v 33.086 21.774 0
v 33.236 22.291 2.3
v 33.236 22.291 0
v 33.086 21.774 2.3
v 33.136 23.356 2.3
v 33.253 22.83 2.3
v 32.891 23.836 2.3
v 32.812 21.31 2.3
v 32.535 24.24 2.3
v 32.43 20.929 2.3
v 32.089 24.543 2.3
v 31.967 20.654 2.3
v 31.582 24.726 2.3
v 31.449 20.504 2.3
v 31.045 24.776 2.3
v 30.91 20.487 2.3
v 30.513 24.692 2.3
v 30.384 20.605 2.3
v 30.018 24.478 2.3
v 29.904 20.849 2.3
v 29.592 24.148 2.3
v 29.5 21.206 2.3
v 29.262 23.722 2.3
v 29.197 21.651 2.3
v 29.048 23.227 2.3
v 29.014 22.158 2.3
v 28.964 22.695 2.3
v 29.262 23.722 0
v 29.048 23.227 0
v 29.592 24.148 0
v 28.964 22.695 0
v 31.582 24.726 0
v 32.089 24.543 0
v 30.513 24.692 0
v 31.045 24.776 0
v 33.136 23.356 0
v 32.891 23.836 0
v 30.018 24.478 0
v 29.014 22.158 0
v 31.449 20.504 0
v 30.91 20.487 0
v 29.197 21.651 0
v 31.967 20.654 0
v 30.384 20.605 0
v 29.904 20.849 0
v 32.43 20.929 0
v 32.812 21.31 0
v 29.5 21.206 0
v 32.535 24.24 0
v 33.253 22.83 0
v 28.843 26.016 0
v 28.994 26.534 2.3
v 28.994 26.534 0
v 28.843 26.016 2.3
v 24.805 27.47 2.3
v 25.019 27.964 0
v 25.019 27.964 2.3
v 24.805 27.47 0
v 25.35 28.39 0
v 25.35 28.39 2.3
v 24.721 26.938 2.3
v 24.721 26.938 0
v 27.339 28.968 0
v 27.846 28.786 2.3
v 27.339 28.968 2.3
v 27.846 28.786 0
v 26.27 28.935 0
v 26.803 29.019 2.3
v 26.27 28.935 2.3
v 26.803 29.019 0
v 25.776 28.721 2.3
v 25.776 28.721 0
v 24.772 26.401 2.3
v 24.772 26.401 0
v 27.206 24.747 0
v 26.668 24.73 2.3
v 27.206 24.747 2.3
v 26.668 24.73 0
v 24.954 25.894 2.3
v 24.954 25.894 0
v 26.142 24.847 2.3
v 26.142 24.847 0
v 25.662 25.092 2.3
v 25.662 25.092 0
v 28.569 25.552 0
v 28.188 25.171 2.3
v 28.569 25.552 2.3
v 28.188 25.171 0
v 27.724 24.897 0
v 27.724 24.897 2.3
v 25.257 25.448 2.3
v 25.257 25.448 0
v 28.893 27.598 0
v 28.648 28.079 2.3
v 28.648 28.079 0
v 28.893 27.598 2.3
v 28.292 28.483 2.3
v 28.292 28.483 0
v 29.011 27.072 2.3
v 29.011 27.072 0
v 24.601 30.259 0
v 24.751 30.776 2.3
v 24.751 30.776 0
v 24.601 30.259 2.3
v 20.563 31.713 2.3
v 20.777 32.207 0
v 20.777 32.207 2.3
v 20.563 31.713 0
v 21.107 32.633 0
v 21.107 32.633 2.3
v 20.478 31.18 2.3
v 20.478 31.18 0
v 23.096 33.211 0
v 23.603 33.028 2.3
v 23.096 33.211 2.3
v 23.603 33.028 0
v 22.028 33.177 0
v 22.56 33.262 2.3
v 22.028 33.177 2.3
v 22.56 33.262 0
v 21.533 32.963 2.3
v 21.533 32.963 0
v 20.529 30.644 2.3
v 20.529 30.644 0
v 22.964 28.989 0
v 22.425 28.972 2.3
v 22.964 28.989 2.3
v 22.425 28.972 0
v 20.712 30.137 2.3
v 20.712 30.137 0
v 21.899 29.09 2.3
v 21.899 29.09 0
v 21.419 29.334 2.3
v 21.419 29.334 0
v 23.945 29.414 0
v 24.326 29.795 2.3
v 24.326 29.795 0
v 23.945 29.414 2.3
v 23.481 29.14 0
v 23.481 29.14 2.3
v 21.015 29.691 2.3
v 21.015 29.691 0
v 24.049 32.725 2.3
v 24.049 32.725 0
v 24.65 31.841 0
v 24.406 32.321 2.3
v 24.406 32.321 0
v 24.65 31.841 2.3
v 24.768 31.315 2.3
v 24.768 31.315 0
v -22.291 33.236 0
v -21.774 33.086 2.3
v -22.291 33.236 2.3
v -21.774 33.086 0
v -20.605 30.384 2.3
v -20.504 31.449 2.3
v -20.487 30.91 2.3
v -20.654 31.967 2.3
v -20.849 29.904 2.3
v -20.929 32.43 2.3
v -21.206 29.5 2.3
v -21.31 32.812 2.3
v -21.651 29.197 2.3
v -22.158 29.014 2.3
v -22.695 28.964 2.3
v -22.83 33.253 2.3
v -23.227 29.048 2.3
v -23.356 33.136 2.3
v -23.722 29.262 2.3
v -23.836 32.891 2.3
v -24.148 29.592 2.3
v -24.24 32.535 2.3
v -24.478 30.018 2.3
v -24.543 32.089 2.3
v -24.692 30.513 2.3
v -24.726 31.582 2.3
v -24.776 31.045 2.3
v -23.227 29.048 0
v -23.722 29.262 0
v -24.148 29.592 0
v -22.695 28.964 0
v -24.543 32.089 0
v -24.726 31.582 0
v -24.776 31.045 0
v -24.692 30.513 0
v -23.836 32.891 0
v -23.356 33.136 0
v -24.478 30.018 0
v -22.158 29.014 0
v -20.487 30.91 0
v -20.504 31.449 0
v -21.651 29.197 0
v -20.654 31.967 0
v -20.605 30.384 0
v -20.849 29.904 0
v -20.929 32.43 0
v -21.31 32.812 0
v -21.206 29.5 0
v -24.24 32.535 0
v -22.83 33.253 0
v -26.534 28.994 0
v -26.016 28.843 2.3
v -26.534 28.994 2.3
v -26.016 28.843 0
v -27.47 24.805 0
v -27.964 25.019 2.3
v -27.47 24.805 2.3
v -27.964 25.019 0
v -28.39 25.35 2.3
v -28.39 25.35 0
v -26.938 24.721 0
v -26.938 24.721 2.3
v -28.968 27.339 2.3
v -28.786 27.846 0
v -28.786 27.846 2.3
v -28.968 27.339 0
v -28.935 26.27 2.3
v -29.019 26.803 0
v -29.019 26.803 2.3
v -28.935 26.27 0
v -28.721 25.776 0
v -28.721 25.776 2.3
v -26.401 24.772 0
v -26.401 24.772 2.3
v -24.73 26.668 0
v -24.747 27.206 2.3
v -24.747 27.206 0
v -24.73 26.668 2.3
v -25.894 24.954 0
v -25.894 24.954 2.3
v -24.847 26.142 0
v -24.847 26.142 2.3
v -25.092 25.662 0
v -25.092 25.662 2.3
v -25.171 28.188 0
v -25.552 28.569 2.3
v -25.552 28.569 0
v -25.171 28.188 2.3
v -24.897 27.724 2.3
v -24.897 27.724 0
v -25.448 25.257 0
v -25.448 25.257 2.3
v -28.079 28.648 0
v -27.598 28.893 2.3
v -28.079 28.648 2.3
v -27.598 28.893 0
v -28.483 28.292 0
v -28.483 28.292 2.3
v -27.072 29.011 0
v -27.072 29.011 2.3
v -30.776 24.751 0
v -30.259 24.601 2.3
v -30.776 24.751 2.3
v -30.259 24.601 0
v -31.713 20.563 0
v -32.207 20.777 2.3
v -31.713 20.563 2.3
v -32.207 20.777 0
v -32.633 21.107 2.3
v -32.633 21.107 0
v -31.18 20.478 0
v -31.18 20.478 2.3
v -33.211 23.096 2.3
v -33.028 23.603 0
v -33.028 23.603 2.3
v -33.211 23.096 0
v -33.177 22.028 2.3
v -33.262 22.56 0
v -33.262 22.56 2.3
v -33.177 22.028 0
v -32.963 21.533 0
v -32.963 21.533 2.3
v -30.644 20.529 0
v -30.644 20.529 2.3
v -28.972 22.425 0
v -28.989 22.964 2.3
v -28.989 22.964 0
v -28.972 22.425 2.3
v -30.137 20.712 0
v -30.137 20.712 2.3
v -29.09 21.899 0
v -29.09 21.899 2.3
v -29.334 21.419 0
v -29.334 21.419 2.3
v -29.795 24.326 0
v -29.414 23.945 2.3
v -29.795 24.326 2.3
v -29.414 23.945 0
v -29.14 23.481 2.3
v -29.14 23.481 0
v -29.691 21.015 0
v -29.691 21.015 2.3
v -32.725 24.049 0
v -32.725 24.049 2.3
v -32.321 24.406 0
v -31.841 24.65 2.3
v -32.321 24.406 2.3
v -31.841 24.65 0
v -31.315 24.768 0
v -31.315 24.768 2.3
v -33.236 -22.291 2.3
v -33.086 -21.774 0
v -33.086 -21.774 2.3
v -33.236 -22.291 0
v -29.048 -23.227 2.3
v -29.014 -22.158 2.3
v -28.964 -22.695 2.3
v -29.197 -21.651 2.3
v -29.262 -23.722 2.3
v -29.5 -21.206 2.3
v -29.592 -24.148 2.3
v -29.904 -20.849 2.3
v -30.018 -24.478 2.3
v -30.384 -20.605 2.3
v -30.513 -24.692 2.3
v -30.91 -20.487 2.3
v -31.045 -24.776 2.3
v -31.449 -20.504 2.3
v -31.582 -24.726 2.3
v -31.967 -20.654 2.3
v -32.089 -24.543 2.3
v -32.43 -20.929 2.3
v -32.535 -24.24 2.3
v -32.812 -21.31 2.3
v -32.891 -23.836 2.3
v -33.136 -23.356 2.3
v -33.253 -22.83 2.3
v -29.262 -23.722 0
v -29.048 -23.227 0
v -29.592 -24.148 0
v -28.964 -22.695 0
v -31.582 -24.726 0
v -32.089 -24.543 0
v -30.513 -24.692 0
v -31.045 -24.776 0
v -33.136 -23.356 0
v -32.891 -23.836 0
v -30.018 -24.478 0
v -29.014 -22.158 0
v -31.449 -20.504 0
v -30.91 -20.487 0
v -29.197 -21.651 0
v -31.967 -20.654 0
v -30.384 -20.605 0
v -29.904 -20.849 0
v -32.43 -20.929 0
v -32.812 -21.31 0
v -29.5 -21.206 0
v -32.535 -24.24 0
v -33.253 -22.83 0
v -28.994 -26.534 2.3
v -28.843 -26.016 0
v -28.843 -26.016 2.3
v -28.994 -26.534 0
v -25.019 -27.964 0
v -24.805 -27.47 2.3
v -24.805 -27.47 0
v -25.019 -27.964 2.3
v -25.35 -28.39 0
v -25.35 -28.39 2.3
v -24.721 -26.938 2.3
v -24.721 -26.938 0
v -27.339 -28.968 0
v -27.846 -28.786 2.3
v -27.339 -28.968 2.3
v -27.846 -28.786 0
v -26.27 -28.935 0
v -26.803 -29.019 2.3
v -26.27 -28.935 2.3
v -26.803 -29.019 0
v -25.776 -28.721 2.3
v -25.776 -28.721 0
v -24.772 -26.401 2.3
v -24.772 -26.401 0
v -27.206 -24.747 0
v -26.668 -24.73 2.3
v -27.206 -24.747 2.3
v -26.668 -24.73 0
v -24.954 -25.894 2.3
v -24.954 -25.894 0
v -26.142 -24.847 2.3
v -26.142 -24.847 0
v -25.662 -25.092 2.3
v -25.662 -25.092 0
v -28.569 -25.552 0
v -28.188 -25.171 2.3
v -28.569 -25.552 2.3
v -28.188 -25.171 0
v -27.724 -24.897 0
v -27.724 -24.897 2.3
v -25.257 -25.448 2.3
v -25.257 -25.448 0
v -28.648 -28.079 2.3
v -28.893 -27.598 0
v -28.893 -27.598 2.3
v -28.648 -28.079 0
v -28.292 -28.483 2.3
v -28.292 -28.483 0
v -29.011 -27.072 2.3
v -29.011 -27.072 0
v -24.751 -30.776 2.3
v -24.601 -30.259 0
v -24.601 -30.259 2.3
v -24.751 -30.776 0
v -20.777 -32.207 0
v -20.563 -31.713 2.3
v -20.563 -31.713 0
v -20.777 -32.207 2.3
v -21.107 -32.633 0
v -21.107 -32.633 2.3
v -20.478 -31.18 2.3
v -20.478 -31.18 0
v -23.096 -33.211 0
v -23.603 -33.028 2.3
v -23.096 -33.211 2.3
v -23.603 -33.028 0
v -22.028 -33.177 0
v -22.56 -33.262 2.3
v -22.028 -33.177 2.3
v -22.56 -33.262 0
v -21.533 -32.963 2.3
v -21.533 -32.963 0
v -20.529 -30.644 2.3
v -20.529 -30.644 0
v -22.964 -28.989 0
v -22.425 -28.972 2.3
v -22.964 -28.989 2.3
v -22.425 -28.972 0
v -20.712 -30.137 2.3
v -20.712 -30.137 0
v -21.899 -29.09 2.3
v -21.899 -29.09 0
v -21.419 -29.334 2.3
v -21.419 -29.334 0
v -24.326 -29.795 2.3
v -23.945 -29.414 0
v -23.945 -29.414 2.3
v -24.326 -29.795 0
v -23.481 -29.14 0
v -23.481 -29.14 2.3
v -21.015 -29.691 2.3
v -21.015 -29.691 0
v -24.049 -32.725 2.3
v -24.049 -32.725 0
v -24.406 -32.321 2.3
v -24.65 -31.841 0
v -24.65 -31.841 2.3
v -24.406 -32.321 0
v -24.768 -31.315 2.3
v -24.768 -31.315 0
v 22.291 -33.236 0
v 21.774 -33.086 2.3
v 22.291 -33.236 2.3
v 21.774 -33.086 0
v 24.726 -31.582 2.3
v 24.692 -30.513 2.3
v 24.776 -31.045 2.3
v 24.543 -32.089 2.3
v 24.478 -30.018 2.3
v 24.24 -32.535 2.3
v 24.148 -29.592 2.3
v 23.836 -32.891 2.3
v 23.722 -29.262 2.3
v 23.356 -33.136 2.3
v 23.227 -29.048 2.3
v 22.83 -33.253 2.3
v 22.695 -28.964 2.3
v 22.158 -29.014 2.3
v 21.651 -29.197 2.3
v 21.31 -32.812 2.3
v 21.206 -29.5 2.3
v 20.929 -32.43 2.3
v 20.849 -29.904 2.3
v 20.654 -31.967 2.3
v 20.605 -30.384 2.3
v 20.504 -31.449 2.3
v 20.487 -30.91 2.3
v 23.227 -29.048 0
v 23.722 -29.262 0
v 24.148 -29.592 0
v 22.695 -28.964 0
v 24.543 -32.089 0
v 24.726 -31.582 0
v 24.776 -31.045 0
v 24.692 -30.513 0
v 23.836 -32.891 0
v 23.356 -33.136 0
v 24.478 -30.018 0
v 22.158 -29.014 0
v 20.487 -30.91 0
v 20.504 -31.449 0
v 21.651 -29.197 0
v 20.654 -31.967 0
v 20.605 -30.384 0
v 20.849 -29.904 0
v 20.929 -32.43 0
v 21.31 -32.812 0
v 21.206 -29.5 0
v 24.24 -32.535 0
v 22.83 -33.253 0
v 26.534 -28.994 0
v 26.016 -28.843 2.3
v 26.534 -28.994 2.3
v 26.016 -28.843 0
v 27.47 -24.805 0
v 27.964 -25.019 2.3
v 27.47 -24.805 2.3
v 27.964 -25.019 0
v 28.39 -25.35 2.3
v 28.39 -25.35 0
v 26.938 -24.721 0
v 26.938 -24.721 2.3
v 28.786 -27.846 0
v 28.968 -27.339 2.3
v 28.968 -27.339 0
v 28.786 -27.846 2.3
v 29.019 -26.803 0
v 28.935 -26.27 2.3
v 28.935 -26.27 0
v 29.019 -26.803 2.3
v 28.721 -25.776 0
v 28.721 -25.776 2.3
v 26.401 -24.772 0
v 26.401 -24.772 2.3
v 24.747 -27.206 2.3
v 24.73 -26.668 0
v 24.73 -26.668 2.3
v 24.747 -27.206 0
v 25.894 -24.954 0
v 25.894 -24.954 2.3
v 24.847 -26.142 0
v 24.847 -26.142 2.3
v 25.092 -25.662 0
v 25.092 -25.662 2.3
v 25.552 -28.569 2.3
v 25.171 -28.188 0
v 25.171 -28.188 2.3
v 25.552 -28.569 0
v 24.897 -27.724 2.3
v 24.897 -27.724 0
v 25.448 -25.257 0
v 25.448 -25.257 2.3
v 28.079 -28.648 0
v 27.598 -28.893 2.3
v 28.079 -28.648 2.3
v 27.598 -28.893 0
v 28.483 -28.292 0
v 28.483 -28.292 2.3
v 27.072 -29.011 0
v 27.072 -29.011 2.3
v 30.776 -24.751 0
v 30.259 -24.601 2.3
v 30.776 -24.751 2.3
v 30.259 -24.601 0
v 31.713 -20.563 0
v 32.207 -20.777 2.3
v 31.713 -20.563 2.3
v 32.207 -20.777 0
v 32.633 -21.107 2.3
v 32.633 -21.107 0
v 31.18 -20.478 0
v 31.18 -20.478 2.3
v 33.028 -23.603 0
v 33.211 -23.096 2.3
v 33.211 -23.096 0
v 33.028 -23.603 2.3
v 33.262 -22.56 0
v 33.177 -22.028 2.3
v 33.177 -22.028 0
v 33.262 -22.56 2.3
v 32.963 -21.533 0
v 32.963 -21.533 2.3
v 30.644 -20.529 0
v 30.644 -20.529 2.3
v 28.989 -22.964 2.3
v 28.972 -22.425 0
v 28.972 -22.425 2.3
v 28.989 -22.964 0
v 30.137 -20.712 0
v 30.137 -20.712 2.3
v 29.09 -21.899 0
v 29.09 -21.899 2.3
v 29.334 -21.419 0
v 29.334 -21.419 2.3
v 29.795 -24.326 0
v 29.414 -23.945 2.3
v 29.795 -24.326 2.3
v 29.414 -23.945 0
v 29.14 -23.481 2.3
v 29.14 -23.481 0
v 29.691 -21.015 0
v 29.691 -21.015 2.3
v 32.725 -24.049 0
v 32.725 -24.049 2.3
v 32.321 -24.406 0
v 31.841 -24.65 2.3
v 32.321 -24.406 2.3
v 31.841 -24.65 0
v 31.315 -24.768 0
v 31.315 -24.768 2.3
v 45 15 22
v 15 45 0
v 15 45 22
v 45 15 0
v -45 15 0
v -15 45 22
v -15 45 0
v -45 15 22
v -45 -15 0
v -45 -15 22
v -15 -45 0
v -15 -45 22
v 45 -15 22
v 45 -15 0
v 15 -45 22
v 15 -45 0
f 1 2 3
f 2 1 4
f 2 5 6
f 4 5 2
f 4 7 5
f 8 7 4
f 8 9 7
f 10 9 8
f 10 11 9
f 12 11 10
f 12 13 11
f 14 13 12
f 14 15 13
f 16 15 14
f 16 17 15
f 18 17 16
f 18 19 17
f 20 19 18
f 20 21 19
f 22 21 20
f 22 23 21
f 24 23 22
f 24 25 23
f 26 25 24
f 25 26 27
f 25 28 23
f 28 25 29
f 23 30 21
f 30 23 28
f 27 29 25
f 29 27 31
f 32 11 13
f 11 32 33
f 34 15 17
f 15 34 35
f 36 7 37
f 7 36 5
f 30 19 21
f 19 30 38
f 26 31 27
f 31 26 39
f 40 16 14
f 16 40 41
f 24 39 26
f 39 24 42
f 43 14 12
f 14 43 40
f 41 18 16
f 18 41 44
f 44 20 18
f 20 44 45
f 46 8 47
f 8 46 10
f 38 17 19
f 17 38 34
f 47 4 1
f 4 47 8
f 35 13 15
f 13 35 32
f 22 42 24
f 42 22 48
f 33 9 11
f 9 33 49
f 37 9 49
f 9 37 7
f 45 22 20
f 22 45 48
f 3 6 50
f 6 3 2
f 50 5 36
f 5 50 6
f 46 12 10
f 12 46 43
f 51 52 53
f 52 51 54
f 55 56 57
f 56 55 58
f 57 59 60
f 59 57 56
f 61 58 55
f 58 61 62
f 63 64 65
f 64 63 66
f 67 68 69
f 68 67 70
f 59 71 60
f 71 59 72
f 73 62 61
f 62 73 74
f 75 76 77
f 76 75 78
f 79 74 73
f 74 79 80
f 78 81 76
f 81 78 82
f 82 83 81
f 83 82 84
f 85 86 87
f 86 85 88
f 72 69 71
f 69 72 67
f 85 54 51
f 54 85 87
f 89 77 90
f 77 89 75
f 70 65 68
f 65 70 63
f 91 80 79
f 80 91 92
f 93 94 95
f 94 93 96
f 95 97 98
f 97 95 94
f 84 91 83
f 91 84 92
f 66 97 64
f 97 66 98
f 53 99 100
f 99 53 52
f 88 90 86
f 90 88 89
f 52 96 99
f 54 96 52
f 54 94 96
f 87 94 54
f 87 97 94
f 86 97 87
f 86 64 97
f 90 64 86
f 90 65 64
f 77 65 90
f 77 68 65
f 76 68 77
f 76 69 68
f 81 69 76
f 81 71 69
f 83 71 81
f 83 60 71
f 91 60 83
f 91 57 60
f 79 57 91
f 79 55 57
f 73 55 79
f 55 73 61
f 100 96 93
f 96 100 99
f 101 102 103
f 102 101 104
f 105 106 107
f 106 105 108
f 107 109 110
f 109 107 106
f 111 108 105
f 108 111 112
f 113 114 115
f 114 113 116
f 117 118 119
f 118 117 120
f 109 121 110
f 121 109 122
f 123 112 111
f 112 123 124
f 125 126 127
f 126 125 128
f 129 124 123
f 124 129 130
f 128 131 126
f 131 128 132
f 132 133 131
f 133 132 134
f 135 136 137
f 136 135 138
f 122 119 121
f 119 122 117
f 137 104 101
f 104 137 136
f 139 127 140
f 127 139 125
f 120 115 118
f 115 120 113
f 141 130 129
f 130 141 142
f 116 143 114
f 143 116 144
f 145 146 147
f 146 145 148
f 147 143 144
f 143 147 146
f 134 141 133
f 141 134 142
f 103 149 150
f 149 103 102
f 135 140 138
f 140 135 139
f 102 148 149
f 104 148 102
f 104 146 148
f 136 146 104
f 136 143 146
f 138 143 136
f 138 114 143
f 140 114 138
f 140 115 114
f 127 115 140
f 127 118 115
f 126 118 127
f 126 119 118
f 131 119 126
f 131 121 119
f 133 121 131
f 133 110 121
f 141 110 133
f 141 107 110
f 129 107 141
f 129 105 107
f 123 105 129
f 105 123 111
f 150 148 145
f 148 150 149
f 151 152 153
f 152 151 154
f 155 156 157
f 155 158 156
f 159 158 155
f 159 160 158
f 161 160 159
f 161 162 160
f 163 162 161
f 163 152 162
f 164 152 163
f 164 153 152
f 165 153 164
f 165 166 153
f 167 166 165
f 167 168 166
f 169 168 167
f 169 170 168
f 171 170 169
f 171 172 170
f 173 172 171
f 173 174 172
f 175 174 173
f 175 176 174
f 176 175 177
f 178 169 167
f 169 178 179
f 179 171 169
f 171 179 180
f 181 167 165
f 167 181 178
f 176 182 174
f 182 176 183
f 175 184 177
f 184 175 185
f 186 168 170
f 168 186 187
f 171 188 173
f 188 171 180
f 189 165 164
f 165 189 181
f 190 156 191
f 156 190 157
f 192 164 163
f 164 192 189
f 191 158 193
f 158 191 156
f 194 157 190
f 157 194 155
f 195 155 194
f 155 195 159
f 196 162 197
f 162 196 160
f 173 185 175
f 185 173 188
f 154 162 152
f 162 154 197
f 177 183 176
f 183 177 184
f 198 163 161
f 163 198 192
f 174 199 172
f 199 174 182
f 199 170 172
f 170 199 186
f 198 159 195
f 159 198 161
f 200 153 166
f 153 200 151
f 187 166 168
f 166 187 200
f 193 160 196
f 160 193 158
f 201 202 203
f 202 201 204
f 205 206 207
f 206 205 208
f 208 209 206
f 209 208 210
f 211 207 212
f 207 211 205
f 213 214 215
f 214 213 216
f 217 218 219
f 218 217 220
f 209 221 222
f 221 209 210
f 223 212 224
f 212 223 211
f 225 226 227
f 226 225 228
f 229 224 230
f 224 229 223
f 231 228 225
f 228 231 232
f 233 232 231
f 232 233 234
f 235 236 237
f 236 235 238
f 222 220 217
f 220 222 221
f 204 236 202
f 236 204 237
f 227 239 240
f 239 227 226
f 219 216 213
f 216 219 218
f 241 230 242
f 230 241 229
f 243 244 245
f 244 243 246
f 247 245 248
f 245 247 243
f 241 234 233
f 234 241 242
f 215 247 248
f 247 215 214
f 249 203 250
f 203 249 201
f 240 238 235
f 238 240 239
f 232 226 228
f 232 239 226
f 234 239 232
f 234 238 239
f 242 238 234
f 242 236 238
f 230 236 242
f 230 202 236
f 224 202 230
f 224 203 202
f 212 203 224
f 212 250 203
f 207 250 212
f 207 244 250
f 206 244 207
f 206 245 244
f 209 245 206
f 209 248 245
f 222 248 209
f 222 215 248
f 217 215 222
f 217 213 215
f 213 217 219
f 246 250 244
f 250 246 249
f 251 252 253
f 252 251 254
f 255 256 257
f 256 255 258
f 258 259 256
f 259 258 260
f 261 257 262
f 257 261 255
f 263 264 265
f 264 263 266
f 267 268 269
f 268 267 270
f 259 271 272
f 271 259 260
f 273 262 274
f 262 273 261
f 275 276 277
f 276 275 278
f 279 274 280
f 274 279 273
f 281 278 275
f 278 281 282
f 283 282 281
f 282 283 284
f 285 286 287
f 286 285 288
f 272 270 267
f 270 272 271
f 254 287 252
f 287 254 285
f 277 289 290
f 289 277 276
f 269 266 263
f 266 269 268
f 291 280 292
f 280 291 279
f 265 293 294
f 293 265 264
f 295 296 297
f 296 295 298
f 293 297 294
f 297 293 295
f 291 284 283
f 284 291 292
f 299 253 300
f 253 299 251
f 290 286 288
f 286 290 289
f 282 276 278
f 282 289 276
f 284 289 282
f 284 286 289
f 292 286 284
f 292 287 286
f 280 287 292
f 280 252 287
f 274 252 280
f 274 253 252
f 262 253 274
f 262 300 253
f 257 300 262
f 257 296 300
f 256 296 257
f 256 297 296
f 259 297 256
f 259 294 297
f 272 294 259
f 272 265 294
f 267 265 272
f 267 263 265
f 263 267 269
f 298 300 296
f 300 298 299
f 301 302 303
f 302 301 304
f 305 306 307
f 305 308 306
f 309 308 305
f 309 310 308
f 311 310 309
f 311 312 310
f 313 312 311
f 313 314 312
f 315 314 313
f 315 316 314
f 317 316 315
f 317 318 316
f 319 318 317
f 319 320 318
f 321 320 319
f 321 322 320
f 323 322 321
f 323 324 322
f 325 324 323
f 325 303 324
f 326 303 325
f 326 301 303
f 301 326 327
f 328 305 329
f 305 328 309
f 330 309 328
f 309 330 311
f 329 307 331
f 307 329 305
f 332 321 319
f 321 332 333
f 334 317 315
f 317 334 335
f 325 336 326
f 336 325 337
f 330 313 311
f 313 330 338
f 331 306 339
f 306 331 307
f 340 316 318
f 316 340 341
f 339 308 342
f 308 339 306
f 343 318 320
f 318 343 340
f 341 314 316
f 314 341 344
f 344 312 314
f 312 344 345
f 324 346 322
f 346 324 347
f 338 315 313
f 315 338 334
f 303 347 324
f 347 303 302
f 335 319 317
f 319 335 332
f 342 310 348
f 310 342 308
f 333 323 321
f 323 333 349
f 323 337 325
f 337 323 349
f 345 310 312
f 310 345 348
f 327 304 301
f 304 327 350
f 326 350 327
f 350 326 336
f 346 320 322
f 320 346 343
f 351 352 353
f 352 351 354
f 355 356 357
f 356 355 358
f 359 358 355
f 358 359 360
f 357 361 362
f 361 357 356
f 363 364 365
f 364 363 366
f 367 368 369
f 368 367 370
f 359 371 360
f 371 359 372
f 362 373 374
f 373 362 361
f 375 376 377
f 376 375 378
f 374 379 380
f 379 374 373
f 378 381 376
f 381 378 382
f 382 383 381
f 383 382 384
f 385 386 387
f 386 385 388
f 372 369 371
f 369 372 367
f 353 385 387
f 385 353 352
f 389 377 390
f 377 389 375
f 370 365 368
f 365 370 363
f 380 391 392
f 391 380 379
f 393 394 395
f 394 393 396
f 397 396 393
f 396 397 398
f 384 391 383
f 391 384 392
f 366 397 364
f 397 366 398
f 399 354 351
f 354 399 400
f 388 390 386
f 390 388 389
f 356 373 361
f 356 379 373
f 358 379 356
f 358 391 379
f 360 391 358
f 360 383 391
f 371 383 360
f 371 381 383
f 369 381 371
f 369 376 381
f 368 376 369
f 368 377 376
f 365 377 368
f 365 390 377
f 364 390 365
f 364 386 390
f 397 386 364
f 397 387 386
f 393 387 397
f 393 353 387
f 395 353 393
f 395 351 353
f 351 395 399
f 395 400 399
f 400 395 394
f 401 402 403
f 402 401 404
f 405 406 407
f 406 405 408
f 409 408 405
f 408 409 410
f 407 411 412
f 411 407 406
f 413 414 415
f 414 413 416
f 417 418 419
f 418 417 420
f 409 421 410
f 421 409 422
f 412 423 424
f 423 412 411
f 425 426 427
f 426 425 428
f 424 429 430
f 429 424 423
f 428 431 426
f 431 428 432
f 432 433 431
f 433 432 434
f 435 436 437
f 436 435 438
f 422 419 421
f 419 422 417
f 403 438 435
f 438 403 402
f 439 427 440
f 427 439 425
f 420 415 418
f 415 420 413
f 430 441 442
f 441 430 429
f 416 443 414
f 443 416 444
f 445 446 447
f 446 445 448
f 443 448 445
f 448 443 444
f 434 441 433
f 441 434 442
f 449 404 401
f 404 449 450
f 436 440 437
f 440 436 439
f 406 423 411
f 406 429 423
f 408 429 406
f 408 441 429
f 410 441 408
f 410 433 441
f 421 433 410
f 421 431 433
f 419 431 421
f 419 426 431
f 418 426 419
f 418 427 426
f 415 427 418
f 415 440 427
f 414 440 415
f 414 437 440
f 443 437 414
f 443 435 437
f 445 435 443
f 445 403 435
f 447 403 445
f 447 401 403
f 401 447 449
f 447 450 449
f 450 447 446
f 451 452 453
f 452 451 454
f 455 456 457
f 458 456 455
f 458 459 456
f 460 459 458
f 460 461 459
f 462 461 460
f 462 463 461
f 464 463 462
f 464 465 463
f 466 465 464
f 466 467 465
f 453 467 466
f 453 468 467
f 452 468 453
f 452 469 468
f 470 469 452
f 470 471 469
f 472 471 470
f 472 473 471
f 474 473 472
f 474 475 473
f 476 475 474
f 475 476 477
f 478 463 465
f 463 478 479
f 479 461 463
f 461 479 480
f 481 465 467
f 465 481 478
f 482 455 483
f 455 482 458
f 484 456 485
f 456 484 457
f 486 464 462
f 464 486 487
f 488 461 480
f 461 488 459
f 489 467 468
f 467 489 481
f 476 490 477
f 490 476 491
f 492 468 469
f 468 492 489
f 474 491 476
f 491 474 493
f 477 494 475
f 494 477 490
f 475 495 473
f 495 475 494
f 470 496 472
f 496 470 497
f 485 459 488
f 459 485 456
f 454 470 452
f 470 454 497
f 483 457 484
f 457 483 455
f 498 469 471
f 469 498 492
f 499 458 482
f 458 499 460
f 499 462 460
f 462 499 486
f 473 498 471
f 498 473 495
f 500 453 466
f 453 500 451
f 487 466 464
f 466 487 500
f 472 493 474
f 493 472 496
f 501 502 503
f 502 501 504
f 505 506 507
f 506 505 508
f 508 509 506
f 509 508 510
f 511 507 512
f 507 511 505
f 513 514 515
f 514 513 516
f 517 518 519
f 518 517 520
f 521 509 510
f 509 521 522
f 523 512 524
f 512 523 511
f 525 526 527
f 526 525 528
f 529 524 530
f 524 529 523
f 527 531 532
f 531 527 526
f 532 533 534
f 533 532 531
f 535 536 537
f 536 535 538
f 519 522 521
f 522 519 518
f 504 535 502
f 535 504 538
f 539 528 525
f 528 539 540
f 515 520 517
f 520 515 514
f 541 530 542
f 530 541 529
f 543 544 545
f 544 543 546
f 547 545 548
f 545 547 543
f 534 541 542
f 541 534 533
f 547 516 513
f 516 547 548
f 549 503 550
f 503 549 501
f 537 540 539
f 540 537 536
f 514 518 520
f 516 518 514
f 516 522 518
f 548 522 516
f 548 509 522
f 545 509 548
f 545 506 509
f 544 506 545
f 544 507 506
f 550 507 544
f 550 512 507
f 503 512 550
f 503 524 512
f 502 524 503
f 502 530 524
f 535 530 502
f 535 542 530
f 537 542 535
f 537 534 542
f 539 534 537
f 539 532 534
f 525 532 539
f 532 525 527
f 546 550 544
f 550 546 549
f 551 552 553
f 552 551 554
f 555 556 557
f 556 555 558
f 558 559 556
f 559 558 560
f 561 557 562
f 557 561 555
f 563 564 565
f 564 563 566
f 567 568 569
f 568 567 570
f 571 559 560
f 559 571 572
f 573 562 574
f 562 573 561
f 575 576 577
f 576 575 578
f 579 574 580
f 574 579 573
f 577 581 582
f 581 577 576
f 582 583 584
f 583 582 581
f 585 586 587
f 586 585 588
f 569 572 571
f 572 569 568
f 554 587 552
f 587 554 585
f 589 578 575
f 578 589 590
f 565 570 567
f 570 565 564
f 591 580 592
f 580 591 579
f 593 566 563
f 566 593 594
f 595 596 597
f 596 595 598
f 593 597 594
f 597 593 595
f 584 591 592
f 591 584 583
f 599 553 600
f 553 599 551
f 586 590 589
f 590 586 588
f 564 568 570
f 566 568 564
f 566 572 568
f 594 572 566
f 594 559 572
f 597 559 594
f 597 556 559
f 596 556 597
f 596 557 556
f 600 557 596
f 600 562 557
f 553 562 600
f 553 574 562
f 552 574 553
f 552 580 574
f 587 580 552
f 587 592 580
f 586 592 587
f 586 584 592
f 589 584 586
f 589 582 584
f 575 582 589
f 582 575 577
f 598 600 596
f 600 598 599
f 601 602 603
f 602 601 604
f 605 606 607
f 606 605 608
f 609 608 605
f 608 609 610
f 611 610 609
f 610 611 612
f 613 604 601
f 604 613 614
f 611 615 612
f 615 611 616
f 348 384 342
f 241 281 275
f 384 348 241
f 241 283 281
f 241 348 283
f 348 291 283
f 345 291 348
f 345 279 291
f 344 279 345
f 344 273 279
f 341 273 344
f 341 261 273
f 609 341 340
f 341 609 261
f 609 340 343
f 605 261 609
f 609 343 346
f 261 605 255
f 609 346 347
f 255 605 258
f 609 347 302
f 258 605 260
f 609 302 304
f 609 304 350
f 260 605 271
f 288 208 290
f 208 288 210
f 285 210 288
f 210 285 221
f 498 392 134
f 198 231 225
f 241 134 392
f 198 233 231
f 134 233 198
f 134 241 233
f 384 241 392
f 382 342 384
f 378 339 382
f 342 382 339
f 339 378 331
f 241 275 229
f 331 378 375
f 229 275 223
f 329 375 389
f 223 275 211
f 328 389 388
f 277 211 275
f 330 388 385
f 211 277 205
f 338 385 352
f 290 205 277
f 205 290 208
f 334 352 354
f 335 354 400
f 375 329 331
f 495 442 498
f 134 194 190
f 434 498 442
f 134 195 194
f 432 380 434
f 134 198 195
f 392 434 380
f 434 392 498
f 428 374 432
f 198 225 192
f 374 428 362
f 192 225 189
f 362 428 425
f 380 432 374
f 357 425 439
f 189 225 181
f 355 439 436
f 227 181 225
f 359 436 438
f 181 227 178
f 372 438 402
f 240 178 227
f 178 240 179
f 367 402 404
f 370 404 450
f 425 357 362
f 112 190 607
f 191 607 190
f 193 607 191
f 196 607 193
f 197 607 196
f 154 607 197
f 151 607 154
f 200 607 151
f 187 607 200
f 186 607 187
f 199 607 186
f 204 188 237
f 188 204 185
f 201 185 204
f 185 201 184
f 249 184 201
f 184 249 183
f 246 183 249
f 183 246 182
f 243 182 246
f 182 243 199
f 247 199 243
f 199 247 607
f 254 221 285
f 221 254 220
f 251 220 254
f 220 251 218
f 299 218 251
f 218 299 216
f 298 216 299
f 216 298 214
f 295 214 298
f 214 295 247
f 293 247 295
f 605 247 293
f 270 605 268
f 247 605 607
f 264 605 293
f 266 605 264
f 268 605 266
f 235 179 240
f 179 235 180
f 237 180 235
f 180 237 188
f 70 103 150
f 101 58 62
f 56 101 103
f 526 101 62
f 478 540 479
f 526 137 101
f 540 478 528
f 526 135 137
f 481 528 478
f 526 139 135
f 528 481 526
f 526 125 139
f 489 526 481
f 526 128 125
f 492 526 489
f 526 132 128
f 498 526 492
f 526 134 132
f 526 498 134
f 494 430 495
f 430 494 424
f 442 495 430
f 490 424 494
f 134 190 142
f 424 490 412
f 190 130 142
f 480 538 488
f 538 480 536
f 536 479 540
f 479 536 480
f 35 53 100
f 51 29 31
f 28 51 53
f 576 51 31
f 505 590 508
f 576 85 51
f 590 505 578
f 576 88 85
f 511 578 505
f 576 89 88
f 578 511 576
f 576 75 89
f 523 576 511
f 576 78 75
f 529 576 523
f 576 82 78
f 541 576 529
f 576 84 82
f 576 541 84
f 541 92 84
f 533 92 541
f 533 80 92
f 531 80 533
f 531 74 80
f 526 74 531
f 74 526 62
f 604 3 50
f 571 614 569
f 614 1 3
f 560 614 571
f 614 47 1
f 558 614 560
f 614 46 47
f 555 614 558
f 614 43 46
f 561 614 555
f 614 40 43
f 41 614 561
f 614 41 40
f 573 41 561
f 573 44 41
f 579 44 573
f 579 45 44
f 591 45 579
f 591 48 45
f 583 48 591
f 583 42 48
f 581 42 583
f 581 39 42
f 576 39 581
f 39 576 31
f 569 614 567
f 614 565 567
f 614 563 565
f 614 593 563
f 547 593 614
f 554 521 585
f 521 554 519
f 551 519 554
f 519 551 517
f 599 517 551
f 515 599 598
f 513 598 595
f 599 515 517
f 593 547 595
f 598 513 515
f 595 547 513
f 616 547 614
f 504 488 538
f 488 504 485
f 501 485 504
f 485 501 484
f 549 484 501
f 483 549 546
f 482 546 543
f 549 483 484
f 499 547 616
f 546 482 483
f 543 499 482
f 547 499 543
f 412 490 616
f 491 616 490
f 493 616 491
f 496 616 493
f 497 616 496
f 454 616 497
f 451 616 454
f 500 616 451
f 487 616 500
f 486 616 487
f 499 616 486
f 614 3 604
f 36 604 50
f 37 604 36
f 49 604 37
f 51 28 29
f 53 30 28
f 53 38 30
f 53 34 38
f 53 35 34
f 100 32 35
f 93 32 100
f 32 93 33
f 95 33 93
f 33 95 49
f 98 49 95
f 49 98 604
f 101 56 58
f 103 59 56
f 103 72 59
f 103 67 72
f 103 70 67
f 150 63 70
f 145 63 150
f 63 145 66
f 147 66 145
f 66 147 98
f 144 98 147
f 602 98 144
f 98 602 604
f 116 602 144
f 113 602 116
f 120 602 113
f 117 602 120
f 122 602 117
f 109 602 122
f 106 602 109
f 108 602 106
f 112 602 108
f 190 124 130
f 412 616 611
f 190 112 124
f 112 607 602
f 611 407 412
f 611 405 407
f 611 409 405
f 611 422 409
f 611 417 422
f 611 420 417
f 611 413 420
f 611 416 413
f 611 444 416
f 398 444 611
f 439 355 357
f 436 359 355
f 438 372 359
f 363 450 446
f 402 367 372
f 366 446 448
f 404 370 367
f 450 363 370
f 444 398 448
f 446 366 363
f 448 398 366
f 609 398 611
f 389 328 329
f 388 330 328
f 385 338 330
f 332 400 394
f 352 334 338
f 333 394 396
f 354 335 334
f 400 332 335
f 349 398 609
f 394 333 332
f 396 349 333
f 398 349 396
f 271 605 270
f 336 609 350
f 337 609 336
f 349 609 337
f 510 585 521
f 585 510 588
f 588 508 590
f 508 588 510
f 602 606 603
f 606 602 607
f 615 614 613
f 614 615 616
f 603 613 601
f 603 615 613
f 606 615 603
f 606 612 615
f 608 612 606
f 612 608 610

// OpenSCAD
// file: ../../util/rounded.scad
// Do a rounded cube
module rounded(x=10, y=10, z=10, r=3, center=false) {
  if (center) {
    translate([-(x/2),-(y/2),0])
      rounded(x, y, z, r);
  } else {
    translate([r,r,0])
    minkowski() {
      cube([x-2*r,y-2*r,z/2]);
      cylinder(h=z/2, r=r);
    }
  }
}
// file: ../../util/hole3.scad
module hole3()
{
    cylinder(d=3.5, h=99, center=true);
}
// file: ../../util/repeat4.scad
module repeat4()
{
    for (r=[0:3])
    rotate([0,0,90*r])
    children();
}
// file: ../../util/hexapath.scad
// Follow an hexagonal path
module hexapath(X, Y, thickness, center=false)
{
    union() {
        linear_extrude(thickness, center=center)
            polygon(points=[
                    [X, Y], [X, -Y], 
                    [Y, -X], [-Y, -X],
                    [-X, -Y], [-X, Y],
                    [-Y, X], [Y, X], 
            ]);
    }
}
// file: ../../models/ollo.scad
// Diameter of plastic ollo holes
OlloHoles = 4.3;

// Width of Ollo "real" plastic
OlloWidth = 3;

// Distance between two ollo holes
OlloSpacing = 6;

// Do an Ollo hole on the part
module olloHole(depth=2.2)
{
    translate([0,0,-0.1])
      cylinder(depth+0.2, OlloHoles/2, OlloHoles/2);
}

// Do 3 ollo holes
module threeOllo(depth=2.2)
{
  for (xy=[[-OlloSpacing,0],[0,0],[OlloSpacing,0]]) {
    translate([xy[0], xy[1], 0])
    olloHole(depth);
  }
}

// Do a servo arm holes
module servoArm(depth=2.2)
{
    threeOllo(depth);
    rotate([0,0,90])
      threeOllo(depth);
}
// file: ../../parts/batfix.scad
include <../models/ollo.scad>;
use <../util/rounded.scad>;
use <../util/screws.scad>;

module batfix(thickness=2.2, cavity=13, height=10, screws=3.2,print=false)
{
	shift=9;
	holesSpacingW = OlloSpacing*7;
	holesSpacingH = OlloSpacing*2;
	R=print?[90,0,0]:[0,0,0];
	translate([-shift,0,height-2*thickness])
	rotate(R)
	difference() {
		union() {
			rounded(50, 20, thickness, 2, center=true);
			translate([shift,0,thickness-height/2])
			cube([cavity+2*thickness,20,height], center=true);
		}
		
		for (X=[-holesSpacingW/2, holesSpacingW/2])
		for (Y=[-holesSpacingH/2, holesSpacingH/2])
		translate([X,Y,-1])			
			cylinder(d=screws, h=thickness+2);
		
		translate([shift,0,0.01+2*thickness-height/2])
			cube([cavity,22,height], center=true);
		
		translate([shift,0,thickness-height])
			children();
	}
}

batfix();
// file: ../../parts/leg.scad
use <../models/ollo.scad>;
use <../util/rounded.scad>;

module leg(sizeA=60, sizeB=20, sizeC=20, sizeBottom=10,
        sizeTop=15, mode="arm", fixationAngle=0, thickness=2.2, print=false)
{
    xOffset = (mode == "side") ? -10 : 0;
    spacing = (mode == "side") ? 24 : 30;

    module legSide()
    {
        difference() {
            union() {
                translate([0,0,sizeA/2])
                    rotate([0,90,0]) {
                        cube([sizeA, 20, thickness], center=true);
                        if (mode == "side") {
                            translate([15-sizeA/2, 10, -thickness/2])
                                rotate([0,0,+fixationAngle])
                                rounded(25,10,thickness, center=true);
                        }
                    }
            }
            translate([-thickness, 0, sizeA-15]) {
                rotate([90,0,90]) {
                    if (mode == "arm") {
                        servoArm(2*thickness);
                    }
                }
                if (mode == "side") {
                    translate([0,10,0])
                        rotate([90,90-fixationAngle,90])
                        threeOllo(2*thickness);
                }
            }
        }
        translate([-thickness/2,0,sizeA]) {
            rotate([90,0,90])
                linear_extrude(thickness)
                polygon([[-10,0],[-1,sizeTop],[1,sizeTop],[10,0]]);
        }
    }

    module biais() {
        Dx = (spacing-sizeBottom)/2;
        Dy = sizeC;
        Dl = sqrt(pow(Dx,2)+pow(Dy,2));

        translate([-(spacing/2)-thickness,-10,-(sizeB+thickness/2)])
            rotate([0,atan2(Dy,Dx),0])
            cube([Dl,20,thickness]);
    }

    if (print) {
        translate([0,0,10-xOffset])
            rotate([90,0,0])
            leg(sizeA, sizeB, sizeC, sizeBottom,
                    sizeTop, mode, fixationAngle, thickness, false);
    } else {
        echo("[PART] leg");
        translate([0,xOffset,-sizeA+15]) {
            cube([spacing+thickness*2, 20, thickness], center=true);

            translate([spacing/2+thickness/2,0,0])
                legSide();
            translate([-(spacing/2+thickness/2),0,0])
                legSide();

            translate([0,0,-sizeB])
                cube([spacing+thickness*2, 20, thickness], center=true);
            translate([spacing/2+thickness/2,0,-sizeB/2])
                cube([thickness,20,sizeB], center=true);
            translate([-(spacing/2+thickness/2),0,-sizeB/2])
                cube([thickness,20,sizeB], center=true);

            translate([0,0,-(sizeB+sizeC)])
                cube([sizeBottom+thickness*2, 20, thickness], center=true);

            biais();
            mirror([1,0,0]) {
                biais();
            }
        }
    }
}

leg();
// file: ../../parts/side.scad
include <../models/ollo.scad>;
use <../util/rounded.scad>;

module side(size=40, holesToBorder=5, thickness=2.2, print=false) {
    if (print) {
        translate([0,-size+holesToBorder,0])
            side(size,holesToBorder,thickness,false);
    } else {
        echo("[PART] side");
        translate([0,size-holesToBorder,0]) {
            difference() {
                rounded(20, size*2, thickness, 5, true);
                for (y=[size-holesToBorder,	 -size+holesToBorder,
                        size-holesToBorder-3*OlloSpacing, -size+holesToBorder+3*OlloSpacing]) {
                    translate([0, y, 0])
                        threeOllo();
                }
            }
        }
    }
}

side();
// file: ../../parts/u.scad
use <../models/ollo.scad>;

module u(height=15, radius=8, thickness=2.2, screwsSpacing=10, screwsDiameter=2.6, screws=true, olloScrew=false, widthSize=15, print=false) {
    module Ubranch() {
        union() {  
            cylinder(thickness, 10, 10);
            translate([-10,0,0])
                cube([20, height, thickness]);
        }
    }

    module USide() {
        difference() {
            union() {
                Ubranch();
                translate([-10,height+radius-thickness,radius])
                    cube([20,thickness,widthSize-(radius-thickness)]);
                translate([-10,height,radius]) {
                    rotate([0,90,0]) {
                        difference() {
                            cylinder(20,radius,radius);
                            translate([0,0,-1])
                                cylinder(22,radius-thickness,radius-thickness);
                            translate([-10+radius-thickness,-10,-1])
                                cube([10,10,22]);
                            translate([-10,-20+radius-thickness,-1])
                                cube([10,20.01,22]);
                        }
                    }
                }
            }
            servoArm(depth=6);
        }
    }

    module UScrews() {
        for (x=[-screwsSpacing/2,screwsSpacing/2]) {
            for (y=[-screwsSpacing/2,screwsSpacing/2]) {
                rotate([270,0,0])
                    translate([x,y,0])
                    cylinder(d=screwsDiameter, h=100);
            }
        }
    }

	module UOllo() {
		rotate(-90, [1,0,0])
			servoArm(2*height);
	}

    if (print) {
        translate([0,0,10])
            rotate([0,90,0])
            u(height,radius,thickness,screwsSpacing,screwsDiameter,
                screws,olloScrew,widthSize,false);
    } else {
        echo("[PART] u");
        difference() {
            translate([0,0,-widthSize-thickness]) {
                USide();
                mirror([0,0,1]) translate([0,0,-2*thickness-2*widthSize])  
                    USide();
            }
            if (screws) {
                UScrews();
            }
            if (olloScrew) {
                UOllo();
            }
        }
    }
}

u();
// file: ../../parts/body.scad
use <../models/ollo.scad>;
use <../util/hexapath.scad>;
use <../util/repeat4.scad>;
use <../util/hole3.scad>;

$fn=25;

module body(thickness=2.2, type="top", print=false) {
    // The layout path
    X=45;
    Y=15;
    
    difference() {
        // Making the exernal path
        hexapath(X, Y, thickness=thickness);
        
        if (type == "top") {
            // Craving the board to make it accessible
            hexapath(X-8, Y-8, thickness=99, center=true);
            
            // Adding holes for the magnets
            repeat4()
            translate([41,0,0])
            hole3();
        } else if (type == "bottom") {
            // Adding holes for the XBoard
            repeat4()
            translate([35, 11.5, 0])
            hole3();
        }
        
        // Motors fixation
        repeat4()
        rotate([0,0,45])
        translate([38,0,0])
        rotate([0,0,90])
        threeOllo();
    }
    
}

body(type="top");
// file: ../../util/screws.scad
module screws(count=4, radius=5, size=3.3, thickness=2.2)
{
	for (screw=[1:count]) {
		rotate([0,0,screw*360/count])
		translate([radius,0,-1])
		cylinder(d=size, h=thickness+2);
	}
}

module squareScrews(w=10, h=10, size=3.3, thickness=2.2) {
	for (X=[-w/2, w/2])
	for (Y=[-h/2, h/2])
	translate([X,Y,-1])		
		cylinder(d=size, h=thickness+2);
}
// file: ../parts.scad
include <config.scad>;
use <../util/screws.scad>;
use <../parts/body.scad>;
use <../parts/u.scad>;
use <../parts/side.scad>;
use <../parts/leg.scad>;
use <../parts/batfix.scad>;

module metabot_colorize() {
    color(PartsColor)
        children();
}

module metabot_u(print=false) {
    metabot_colorize()
        u(UHeight, URadius, Thickness, UScrewsSpacing, UScrewsDiameter, print=print);
}

module metabot_leg(print=false) {
    metabot_colorize()
        leg(LegSizeA, LegSizeB, LegSizeC, LegSizeBottom,
                LegSizeTop, (MotorsPerLeg == 2 ? "side" : "arm"), L3Angle, Thickness, print=print);
}

module metabot_body_screws() {
	squareScrews(BodyScrewsW, BodyScrewsH, BodyScrewsSize, Thickness);
}

module metabot_body(print=false, top=false) {
    metabot_colorize()
        body(BodySize, Legs, Thickness, print=print)
		if (top && BodyScrews) {
			metabot_body_screws();
		}
}

module metabot_side(print=false) {
    metabot_colorize()
        side(SideSize, SideHolesToBorder, Thickness, print=print);
}

module metabot_batfix(print=false) {
	metabot_colorize()
    	batfix(print=print)
        	metabot_body_screws();
}
// file: ../config.scad
// Number of legs
Legs = 4;

// Size of the body
BodySize = 22;

// Number of motors per leg (2 or 3)
MotorsPerLeg = 3;

// Static L3 angle (used only if 2 motors per leg)
L3Angle = -5;

// Color of the parts, for rendering
PartsColor = [0.8, 0.8, 0.8];

// Thickness of parts (2.2 is good for Ollo rivets)
Thickness = 2.2;

// Sizes of the parts of the leg
// Ratio of leg parts
LegSize = 100;
LegSizeA = (0.60)*LegSize;
LegSizeB = (0.20)*LegSize;
LegSizeC = (0.20)*LegSize;

// Width of the bottom part of the leg
LegSizeBottom = 10;

// Size of the "top" part of the legs, in mm
LegSizeTop = 30;

// Body screws
BodyScrews = true;
BodyScrewsSize = 3.3;
BodyScrewsW = 7;
BodyScrewsH = 12;

// Motor dimensions
MotorWidth = 24;
MotorHeight = 36;
MotorDepth = 24;
MotorArmOffset = 9;

// U dimensions
UHeight = 15.2;
URadius = 8;
UWidth = 30+Thickness/2;
UTotalHeight = UHeight+URadius;
UScrewsSpacing = 10;
UScrewsDiameter= 3.3;

// Side dimensions
SideSize = 35;
SideHolesToBorder = 5;

// Defining the resolution
$fn=35;
// main file
include <../config.scad>;
use <../parts.scad>;

metabot_body(print=true);
